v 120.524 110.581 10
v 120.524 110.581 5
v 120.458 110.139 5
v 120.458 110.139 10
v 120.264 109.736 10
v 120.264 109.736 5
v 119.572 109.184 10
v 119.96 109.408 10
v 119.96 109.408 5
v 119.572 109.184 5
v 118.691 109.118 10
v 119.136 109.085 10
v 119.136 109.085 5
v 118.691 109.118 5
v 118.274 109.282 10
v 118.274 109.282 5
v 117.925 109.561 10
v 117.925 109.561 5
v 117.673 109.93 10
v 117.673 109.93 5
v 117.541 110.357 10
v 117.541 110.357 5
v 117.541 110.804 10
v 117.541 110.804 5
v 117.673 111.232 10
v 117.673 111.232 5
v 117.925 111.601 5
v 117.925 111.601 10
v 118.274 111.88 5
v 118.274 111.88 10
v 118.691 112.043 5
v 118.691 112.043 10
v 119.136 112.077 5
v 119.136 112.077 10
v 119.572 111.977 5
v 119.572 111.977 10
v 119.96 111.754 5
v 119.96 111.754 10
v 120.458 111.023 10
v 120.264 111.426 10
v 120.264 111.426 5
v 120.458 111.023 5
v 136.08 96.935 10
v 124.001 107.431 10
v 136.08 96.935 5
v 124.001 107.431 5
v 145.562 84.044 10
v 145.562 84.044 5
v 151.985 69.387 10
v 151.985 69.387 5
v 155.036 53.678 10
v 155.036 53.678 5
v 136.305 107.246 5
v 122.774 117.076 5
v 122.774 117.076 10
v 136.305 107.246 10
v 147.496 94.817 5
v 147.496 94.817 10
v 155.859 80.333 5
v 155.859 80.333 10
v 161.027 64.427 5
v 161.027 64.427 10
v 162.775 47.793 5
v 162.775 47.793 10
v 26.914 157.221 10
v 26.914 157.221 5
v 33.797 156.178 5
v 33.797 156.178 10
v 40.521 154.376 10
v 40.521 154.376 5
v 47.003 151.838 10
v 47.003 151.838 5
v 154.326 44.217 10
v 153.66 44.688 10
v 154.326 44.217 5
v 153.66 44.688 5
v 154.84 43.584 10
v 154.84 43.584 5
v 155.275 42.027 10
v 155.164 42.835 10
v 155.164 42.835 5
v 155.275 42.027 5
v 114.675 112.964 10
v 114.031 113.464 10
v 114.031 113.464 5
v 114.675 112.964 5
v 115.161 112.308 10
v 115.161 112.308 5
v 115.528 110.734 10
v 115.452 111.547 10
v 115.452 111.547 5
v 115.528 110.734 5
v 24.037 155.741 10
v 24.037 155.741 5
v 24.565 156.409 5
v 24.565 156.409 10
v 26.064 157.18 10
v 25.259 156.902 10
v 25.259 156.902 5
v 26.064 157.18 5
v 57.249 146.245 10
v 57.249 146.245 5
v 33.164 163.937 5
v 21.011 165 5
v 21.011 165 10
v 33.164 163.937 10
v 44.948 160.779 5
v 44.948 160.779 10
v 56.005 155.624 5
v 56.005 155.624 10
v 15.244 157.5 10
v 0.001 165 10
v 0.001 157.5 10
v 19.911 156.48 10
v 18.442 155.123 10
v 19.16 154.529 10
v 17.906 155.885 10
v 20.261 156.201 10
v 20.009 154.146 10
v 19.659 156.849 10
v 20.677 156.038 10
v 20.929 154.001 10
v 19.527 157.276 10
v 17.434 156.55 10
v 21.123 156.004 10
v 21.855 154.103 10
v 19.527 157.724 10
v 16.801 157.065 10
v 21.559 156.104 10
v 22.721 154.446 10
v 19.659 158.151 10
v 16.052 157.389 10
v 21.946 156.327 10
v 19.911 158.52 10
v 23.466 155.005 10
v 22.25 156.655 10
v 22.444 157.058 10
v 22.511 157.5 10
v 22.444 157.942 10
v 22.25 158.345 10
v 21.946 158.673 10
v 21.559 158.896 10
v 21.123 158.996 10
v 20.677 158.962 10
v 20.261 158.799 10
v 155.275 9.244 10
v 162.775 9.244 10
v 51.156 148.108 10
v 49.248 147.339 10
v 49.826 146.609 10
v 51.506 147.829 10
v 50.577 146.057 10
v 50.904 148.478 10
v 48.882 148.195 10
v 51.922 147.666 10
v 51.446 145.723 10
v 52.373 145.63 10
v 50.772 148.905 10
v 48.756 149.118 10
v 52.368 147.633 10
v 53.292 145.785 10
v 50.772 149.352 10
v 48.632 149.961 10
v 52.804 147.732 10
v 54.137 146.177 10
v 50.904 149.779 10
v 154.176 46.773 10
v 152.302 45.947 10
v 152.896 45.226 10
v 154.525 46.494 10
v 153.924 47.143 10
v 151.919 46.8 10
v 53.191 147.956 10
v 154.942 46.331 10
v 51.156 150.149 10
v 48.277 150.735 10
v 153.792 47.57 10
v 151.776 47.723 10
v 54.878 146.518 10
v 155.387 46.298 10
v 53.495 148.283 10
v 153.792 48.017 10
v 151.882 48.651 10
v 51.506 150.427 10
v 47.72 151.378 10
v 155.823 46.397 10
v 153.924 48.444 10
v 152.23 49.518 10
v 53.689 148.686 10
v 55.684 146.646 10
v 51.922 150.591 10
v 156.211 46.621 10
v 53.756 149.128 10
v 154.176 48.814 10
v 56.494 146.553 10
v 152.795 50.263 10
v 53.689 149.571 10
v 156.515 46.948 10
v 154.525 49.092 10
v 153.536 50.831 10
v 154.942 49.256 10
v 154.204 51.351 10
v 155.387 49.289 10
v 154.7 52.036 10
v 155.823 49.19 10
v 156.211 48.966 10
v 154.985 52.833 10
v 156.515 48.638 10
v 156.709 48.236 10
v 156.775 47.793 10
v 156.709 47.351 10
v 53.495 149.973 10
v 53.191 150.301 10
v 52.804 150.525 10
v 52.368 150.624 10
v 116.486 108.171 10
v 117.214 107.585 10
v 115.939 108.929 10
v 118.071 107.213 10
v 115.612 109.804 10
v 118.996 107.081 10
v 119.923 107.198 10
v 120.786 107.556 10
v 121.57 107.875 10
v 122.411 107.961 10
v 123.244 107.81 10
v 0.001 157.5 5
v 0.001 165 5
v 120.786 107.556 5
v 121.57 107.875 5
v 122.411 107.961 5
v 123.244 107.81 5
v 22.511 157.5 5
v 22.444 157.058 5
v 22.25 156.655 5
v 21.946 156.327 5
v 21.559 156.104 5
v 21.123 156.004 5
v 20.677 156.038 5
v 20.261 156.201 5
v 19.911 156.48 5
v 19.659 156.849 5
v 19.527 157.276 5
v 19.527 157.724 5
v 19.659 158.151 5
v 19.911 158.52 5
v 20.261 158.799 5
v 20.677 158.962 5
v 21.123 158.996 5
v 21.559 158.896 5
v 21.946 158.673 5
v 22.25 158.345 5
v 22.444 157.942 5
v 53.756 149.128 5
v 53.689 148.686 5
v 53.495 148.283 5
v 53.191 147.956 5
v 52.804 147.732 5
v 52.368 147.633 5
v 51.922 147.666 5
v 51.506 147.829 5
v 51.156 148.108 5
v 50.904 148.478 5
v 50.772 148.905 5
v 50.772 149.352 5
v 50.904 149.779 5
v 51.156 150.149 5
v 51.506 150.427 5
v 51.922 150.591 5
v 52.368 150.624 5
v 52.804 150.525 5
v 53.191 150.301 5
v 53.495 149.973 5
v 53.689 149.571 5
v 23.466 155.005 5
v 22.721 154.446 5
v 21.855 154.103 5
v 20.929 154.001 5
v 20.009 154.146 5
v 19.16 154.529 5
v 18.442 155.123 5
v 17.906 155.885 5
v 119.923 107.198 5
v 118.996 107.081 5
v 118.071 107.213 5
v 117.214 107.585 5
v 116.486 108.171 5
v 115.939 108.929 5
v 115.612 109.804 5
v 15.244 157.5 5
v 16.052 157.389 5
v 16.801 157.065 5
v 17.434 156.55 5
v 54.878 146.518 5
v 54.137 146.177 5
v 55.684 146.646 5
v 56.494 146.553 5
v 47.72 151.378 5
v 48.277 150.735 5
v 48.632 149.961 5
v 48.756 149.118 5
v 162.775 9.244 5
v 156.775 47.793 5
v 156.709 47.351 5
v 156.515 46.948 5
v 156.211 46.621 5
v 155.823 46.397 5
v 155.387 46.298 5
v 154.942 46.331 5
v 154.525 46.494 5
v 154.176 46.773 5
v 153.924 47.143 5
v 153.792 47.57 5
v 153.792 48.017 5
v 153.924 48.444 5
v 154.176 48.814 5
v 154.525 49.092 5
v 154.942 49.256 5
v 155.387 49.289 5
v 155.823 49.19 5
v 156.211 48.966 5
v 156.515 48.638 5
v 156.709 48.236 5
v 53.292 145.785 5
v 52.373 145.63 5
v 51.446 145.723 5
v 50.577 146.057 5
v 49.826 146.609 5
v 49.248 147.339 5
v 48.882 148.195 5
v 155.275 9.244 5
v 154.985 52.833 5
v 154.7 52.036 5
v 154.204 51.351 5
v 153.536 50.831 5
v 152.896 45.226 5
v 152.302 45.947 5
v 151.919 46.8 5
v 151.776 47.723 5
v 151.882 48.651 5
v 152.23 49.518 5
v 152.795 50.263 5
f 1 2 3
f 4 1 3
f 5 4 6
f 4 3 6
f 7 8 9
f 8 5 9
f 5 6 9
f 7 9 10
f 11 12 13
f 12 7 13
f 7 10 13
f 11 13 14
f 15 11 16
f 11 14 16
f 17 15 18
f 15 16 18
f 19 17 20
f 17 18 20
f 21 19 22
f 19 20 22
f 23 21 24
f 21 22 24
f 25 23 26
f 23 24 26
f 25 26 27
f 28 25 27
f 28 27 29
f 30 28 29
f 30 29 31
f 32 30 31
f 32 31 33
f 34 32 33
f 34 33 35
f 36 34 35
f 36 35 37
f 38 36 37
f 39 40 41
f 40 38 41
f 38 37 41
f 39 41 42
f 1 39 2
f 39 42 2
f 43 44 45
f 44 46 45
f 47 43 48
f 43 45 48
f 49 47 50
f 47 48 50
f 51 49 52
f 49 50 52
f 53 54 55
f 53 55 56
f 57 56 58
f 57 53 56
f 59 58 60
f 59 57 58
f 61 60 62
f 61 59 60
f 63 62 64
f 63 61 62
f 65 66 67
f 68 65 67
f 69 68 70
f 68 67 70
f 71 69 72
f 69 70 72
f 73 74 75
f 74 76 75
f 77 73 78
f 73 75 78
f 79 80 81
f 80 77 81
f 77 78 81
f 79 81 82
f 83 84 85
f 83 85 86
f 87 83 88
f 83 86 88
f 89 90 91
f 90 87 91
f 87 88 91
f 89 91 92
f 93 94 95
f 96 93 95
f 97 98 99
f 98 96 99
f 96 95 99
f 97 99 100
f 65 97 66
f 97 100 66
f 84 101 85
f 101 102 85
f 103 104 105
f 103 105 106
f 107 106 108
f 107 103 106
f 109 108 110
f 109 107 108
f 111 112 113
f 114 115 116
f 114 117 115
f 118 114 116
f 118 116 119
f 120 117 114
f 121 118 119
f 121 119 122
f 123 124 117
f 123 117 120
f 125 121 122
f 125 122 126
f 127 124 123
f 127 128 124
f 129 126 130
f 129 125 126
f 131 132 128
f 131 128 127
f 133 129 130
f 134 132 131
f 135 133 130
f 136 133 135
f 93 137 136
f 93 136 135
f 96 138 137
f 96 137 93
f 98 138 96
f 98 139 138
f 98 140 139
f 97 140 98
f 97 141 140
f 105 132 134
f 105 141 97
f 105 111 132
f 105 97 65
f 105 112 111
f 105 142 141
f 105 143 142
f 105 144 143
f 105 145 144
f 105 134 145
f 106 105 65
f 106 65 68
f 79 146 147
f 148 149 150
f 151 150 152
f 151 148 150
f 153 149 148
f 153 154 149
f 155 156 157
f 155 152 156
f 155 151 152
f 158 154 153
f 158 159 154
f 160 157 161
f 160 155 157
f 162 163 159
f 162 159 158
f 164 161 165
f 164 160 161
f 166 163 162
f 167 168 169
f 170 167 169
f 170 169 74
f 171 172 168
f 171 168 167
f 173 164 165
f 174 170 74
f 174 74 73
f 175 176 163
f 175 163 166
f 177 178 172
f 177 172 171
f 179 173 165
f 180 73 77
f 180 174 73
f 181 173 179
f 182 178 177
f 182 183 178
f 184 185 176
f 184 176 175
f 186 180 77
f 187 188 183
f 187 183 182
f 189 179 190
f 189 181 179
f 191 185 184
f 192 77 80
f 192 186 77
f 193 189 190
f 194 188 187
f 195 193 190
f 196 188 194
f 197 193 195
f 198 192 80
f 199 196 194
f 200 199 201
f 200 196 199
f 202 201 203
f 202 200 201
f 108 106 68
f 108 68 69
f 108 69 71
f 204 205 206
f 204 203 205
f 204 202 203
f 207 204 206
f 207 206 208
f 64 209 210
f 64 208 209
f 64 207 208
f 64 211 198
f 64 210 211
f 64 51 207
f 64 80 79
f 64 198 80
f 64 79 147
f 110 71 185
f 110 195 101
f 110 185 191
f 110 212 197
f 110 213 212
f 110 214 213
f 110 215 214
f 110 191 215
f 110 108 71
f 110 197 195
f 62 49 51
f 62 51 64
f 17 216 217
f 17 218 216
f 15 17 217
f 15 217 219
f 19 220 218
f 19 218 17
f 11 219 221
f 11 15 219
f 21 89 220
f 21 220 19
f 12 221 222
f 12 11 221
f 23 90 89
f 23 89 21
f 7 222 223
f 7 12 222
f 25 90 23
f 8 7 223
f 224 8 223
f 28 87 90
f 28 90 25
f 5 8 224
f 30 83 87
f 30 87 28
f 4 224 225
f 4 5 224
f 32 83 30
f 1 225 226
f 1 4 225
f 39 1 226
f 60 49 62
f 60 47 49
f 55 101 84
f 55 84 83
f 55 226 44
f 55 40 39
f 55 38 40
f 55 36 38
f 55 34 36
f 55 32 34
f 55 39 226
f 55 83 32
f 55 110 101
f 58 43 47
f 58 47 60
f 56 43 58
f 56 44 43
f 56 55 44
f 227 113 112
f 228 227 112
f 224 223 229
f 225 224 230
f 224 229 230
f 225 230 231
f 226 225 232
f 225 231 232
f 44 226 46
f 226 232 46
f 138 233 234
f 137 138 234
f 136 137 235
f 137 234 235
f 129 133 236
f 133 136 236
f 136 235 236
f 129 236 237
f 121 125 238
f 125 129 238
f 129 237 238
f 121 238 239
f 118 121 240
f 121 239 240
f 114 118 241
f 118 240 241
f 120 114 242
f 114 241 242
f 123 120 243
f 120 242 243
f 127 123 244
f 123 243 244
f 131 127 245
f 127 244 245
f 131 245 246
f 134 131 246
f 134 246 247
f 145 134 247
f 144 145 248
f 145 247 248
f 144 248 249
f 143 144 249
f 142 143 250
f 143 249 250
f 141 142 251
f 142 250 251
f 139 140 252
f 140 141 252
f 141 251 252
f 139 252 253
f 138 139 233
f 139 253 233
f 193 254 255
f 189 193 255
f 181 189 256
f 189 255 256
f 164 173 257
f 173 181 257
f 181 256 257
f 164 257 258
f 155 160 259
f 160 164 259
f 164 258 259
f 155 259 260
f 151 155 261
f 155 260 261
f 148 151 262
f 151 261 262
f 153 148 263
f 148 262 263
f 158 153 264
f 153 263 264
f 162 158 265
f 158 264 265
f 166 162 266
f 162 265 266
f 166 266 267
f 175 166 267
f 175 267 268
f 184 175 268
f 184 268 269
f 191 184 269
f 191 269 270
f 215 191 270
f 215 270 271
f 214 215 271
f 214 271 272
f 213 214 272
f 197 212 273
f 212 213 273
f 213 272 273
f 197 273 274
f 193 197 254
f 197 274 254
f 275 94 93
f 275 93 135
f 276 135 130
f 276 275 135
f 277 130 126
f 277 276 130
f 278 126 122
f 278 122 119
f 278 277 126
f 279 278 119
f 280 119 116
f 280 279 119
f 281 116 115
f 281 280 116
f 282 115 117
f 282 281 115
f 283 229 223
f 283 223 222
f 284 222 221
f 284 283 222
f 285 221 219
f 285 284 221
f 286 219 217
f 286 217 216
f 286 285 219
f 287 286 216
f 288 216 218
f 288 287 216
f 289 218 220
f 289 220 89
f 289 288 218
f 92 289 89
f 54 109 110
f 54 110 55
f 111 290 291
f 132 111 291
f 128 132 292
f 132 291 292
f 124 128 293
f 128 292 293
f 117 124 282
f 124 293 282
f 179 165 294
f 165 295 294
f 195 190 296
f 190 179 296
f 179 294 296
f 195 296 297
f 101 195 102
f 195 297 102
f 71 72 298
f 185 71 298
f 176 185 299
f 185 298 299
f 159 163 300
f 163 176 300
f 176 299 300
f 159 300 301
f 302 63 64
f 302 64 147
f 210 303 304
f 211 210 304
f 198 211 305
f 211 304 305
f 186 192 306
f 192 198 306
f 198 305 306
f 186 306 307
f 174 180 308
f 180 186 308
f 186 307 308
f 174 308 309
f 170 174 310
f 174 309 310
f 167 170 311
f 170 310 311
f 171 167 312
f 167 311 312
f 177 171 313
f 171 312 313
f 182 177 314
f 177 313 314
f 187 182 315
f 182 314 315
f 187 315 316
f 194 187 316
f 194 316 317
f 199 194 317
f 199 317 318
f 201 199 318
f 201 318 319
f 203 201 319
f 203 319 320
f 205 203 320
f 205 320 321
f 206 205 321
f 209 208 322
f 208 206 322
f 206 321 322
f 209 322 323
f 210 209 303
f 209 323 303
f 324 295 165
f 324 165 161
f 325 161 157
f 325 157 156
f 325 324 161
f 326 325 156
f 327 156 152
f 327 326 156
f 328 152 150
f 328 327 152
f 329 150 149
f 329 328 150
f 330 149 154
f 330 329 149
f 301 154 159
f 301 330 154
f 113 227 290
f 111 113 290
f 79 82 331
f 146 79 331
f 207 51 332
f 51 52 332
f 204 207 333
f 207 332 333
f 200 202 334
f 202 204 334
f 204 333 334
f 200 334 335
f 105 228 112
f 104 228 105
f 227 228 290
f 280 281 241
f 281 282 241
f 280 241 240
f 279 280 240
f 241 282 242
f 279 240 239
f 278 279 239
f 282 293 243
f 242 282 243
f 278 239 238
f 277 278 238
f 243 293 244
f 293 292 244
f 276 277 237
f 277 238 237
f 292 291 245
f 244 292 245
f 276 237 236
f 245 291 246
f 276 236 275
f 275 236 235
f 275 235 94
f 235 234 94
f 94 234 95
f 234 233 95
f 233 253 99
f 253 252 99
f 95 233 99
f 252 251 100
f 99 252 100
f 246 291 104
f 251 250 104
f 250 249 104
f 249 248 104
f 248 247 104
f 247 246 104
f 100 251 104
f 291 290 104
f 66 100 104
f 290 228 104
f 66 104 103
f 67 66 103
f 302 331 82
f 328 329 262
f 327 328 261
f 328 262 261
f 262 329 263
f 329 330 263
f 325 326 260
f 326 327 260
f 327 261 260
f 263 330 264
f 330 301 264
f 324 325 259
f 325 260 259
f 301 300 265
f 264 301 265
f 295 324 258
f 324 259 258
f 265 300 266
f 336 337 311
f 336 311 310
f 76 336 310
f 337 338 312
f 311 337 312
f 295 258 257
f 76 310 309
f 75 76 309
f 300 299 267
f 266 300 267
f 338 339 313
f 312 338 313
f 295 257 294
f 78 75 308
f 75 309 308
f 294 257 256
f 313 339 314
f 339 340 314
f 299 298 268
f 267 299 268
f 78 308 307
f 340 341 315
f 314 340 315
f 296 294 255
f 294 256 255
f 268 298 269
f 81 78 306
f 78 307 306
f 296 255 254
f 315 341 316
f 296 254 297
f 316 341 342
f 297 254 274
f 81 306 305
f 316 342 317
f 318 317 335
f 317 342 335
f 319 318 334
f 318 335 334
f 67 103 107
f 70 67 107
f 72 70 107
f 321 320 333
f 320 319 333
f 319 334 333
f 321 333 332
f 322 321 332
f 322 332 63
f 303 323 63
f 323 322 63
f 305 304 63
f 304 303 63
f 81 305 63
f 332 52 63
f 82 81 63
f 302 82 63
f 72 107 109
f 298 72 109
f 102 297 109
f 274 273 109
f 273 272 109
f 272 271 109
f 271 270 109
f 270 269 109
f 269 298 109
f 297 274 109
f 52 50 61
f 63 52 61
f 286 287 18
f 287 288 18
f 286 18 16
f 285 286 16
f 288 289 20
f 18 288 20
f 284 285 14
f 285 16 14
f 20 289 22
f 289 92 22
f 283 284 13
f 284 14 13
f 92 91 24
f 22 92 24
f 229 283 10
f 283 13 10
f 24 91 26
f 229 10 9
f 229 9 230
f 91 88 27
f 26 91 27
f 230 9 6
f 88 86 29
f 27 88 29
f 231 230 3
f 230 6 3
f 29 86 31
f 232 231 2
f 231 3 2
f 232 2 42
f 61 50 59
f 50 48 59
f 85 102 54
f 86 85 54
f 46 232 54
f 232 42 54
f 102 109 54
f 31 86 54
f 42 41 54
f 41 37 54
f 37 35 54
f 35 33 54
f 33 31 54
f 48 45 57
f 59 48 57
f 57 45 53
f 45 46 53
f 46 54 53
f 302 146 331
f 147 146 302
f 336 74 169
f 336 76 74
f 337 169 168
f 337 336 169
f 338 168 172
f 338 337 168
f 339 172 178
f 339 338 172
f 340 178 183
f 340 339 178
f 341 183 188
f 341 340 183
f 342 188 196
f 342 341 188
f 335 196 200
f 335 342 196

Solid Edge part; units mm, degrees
sketch "Sketch1" plane through (0.0007, 14.651, 5) normal (0, 0, 1) x (1, 0, 0)
  line L0 (-114.0407, 98.8093) -> (-57.2599, 131.5929)
  arc A0 (-54.1474, 131.5247) -> (-57.2599, 131.5929) centre (-55.7598, 128.9948) ccw
  arc A1 (-47.0142, 137.1861) -> (-48.7662, 134.4664) centre (-45.7662, 134.458) ccw
  arc A2 (-47.0142, 137.1861) -> (-26.9146, 142.5706) centre (-21.0226, 80.3698) cw
  arc A3 (-24.0376, 141.0909) -> (-26.9146, 142.5706) centre (-26.6317, 139.5839) ccw
  arc A4 (-15.245, 142.849) -> (-17.9063, 141.2336) centre (-15.245, 139.849) ccw
  line L1 (-15.245, 142.849) -> (15.2436, 142.849)
  arc A5 (17.905, 141.2336) -> (15.2436, 142.849) centre (15.2436, 139.849) ccw
  arc A6 (26.9132, 142.5696) -> (24.036, 141.0904) centre (26.6298, 139.583) ccw
  arc A7 (26.9132, 142.5696) -> (47.0027, 137.1869) centre (21.0099, 80.3561) cw
  arc A8 (48.7549, 134.4673) -> (47.0027, 137.1869) centre (45.7549, 134.4587) ccw
  arc A9 (57.2487, 131.5943) -> (54.1362, 131.526) centre (55.7487, 128.9962) ccw
  line L2 (57.2487, 131.5943) -> (114.0299, 98.8129)
  arc A10 (115.5271, 96.0833) -> (114.0299, 98.8129) centre (112.5299, 96.2148) ccw
  arc A11 (124.0003, 92.7805) -> (120.7849, 92.9052) centre (122.2944, 90.3127) ccw
  arc A12 (124.0003, 92.7805) -> (155.0355, 39.027) centre (82.7747, 33.1424) cw
  arc A13 (153.5358, 36.1799) -> (155.0355, 39.027) centre (152.0454, 38.7835) ccw
  arc A14 (155.2747, 27.3761) -> (153.6593, 30.0375) centre (152.2747, 27.3761) ccw
  line L3 (155.2747, 27.3761) -> (155.2747, -38.192)
  arc A15 (153.6593, -40.8534) -> (155.2747, -38.192) centre (152.2747, -38.192) ccw
  arc A16 (154.9954, -49.8615) -> (153.5161, -46.9844) centre (152.0088, -49.5782) ccw
  arc A17 (154.9954, -49.8615) -> (149.6134, -69.9554) centre (92.7533, -43.9583) cw
  arc A18 (146.8942, -71.7079) -> (149.6134, -69.9554) centre (146.8851, -68.7079) ccw
  arc A19 (144.0217, -80.2016) -> (143.9534, -77.0892) centre (141.4236, -78.7016) ccw
  line L4 (144.0217, -80.2016) -> (127.6444, -108.5679)
  arc A20 (122.7007, -116.5716) -> (122.8583, -113.3403) centre (120.256, -114.8329) ccw
  arc A21 (77.6703, -142.5696) -> (122.7007, -116.5716) centre (71.767, -80.3476) ccw
  arc A22 (74.7931, -141.0904) -> (77.6703, -142.5696) centre (77.3869, -139.583) ccw
  arc A23 (66.0007, -142.849) -> (68.6621, -141.2336) centre (66.0007, -139.849) ccw
  line L5 (5.7656, -142.849) -> (66.0007, -142.849)
  arc A24 (3.1042, -141.2336) -> (5.7656, -142.849) centre (5.7656, -139.849) ccw
  arc A25 (-5.767, -142.849) -> (-3.1056, -141.2336) centre (-5.767, -139.849) ccw
  line L6 (-66.0021, -142.849) -> (-5.767, -142.849)
  arc A26 (-68.6634, -141.2336) -> (-66.0021, -142.849) centre (-66.0021, -139.849) ccw
  arc A27 (-77.6716, -142.5694) -> (-74.7944, -141.0903) centre (-77.3881, -139.5828) ccw
  arc A28 (-122.6994, -116.5717) -> (-77.6716, -142.5694) centre (-71.7665, -80.349) ccw
  arc A29 (-122.857, -113.3404) -> (-122.6994, -116.5717) centre (-120.2547, -114.833) ccw
  arc A30 (-128.7762, -106.6053) -> (-126.0465, -108.1024) centre (-126.1781, -105.1053) ccw
  line L7 (-144.0218, -80.199) -> (-128.7762, -106.6053)
  arc A31 (-143.9535, -77.0865) -> (-144.0218, -80.199) centre (-141.4237, -78.699) ccw
  arc A32 (-149.6144, -69.9531) -> (-146.8949, -71.7053) centre (-146.8862, -68.7053) ccw
  arc A33 (-154.9987, -49.8585) -> (-149.6144, -69.9531) centre (-92.7672, -43.9523) ccw
  arc A34 (-153.5196, -46.9813) -> (-154.9987, -49.8585) centre (-152.0122, -49.5751) ccw
  arc A35 (-155.2786, -38.189) -> (-153.6631, -40.8503) centre (-152.2786, -38.1889) ccw
  line L8 (-155.2818, 27.3758) -> (-155.2786, -38.189)
  arc A36 (-153.6665, 30.0373) -> (-155.2818, 27.3758) centre (-152.2818, 27.376) ccw
  arc A37 (-155.0428, 39.0267) -> (-153.5432, 36.1796) centre (-152.0527, 38.7832) ccw
  arc A38 (-124.0109, 92.7765) -> (-155.0428, 39.0267) centre (-82.7847, 33.1421) ccw
  arc A39 (-120.7955, 92.9014) -> (-124.0109, 92.7765) centre (-122.3049, 90.3088) ccw
  arc A40 (-114.0407, 98.8093) -> (-115.5378, 96.0796) centre (-112.5406, 96.2112) ccw
  arc A41 (-48.7662, 134.4664) -> (-54.1474, 131.5247) centre (-52.2662, 134.4761) cw
  arc A42 (-17.9064, 141.2336) -> (-24.0377, 141.0909) centre (-21.0113, 142.849) cw
  arc A43 (24.036, 141.0904) -> (17.905, 141.2336) centre (21.0099, 142.849) cw
  arc A44 (54.1362, 131.526) -> (48.7549, 134.4673) centre (52.2549, 134.4774) cw
  arc A45 (120.7849, 92.9052) -> (115.5271, 96.0832) centre (119.0237, 95.9298) cw
  arc A46 (153.6593, 30.0375) -> (153.5358, 36.1799) centre (155.2747, 33.1424) cw
  arc A47 (153.5161, -46.9844) -> (153.6593, -40.8534) centre (155.2747, -43.9583) cw
  arc A48 (143.9534, -77.0891) -> (146.8942, -71.7079) centre (146.9048, -75.2079) cw
  arc A49 (122.8584, -113.3404) -> (127.6444, -108.5679) centre (125.8944, -111.599) cw
  arc A50 (68.6621, -141.2336) -> (74.7931, -141.0904) centre (71.767, -142.849) cw
  arc A51 (-3.1056, -141.2336) -> (3.1042, -141.2336) centre (-0.0007, -142.849) cw
  arc A52 (-74.7944, -141.0903) -> (-68.6635, -141.2336) centre (-71.7684, -142.849) cw
  arc A53 (-126.0466, -108.1024) -> (-122.857, -113.3404) centre (-125.8931, -111.599) cw
  arc A54 (-146.8949, -71.7053) -> (-143.9536, -77.0866) centre (-146.905, -75.2053) cw
  arc A55 (-153.6632, -40.8503) -> (-153.5196, -46.9813) centre (-155.2784, -43.9553) cw
  arc A56 (-153.5432, 36.1796) -> (-153.6665, 30.0373) centre (-155.2821, 33.1421) cw
  arc A57 (-115.5377, 96.0796) -> (-120.7955, 92.9014) centre (-119.0344, 95.926) cw
  line L9 (-56.0166, 140.971) -> (-122.7845, 102.4212)
  arc A58 (-162.7821, 33.1421) -> (-122.7845, 102.4212) centre (-82.7847, 33.1421) cw
  line L10 (-162.7821, 33.1421) -> (-162.7784, -43.9553)
  arc A59 (-162.7784, -43.9553) -> (-153.4002, -78.9553) centre (-92.7784, -43.9553) ccw
  line L11 (-132.3882, -115.349) -> (-153.4002, -78.9553)
  arc A60 (-132.3882, -115.349) -> (-71.7683, -150.349) centre (-71.7665, -80.349) ccw
  line L12 (71.767, -150.349) -> (-71.7683, -150.349)
  arc A61 (71.767, -150.349) -> (132.3896, -115.349) centre (71.7678, -80.349) ccw
  line L13 (132.3896, -115.349) -> (153.4002, -78.9576)
  arc A62 (162.7747, -43.9583) -> (153.4002, -78.9576) centre (92.791, -43.9684) cw
  line L14 (162.7747, 33.1424) -> (162.7747, -43.9583)
  arc A63 (122.7736, 102.4251) -> (162.7747, 33.1424) centre (82.7747, 33.1424) cw
  line L15 (56.0045, 140.9728) -> (122.7736, 102.4251)
  arc A64 (21.0099, 150.349) -> (56.0045, 140.9728) centre (21.008, 80.349) cw
  line L16 (-21.0112, 150.349) -> (21.0099, 150.349)
  arc A65 (-32.5074, 149.4015) -> (-21.0112, 150.349) centre (-20.997, 79.961) cw
  arc A66 (-44.641, 146.2432) -> (-32.5074, 149.4015) centre (-21.0122, 80.3518) cw
  arc A67 (-56.0166, 140.971) -> (-44.641, 146.2432) centre (-21.0122, 80.3518) cw
  circle A68 centre (-71.7683, -142.849) radius 1.5
  circle A69 centre (-0.0007, -142.849) radius 1.5
  circle A70 centre (-125.893, -111.599) radius 1.5
  circle A71 centre (-146.905, -75.2053) radius 1.5
  circle A72 centre (-155.2784, -43.9553) radius 1.5
  circle A73 centre (-155.2821, 33.1421) radius 1.5
  circle A74 centre (-119.0344, 95.9261) radius 1.5
  circle A75 centre (-52.2662, 134.4761) radius 1.5
  circle A76 centre (-21.0112, 142.849) radius 1.5
  circle A77 centre (21.0099, 142.849) radius 1.5
  circle A78 centre (52.2549, 134.4774) radius 1.5
  circle A79 centre (119.0237, 95.9298) radius 1.5
  circle A80 centre (155.2747, 33.1424) radius 1.5
  circle A81 centre (155.2747, -43.9583) radius 1.5
  circle A82 centre (146.9048, -75.2079) radius 1.5
  circle A83 centre (125.8944, -111.599) radius 1.5
  circle A84 centre (71.767, -142.849) radius 1.5
extrude "ExtrudedProtrusion_7" add sketch "Sketch1" along normal blind 5
sketch "Sketch2" plane through (-0.003, 14.651, 10) normal (0, 0, 1) x (1, 0, 0)
  line L0 (-170.0115, -5.4066) -> (169.0999, -5.4066)
  line L1 (169.0999, -5.4066) -> (169.0999, -159.984)
  line L2 (169.0999, -159.984) -> (-170.0115, -159.984)
  line L3 (-170.0115, -159.984) -> (-170.0115, -5.4066)
extrude "Cutout1" cut sketch "Sketch2" against normal up to next
sketch "Sketch3" plane through (-0.003, 87.1222, 10) normal (0, 0, 1) x (0.866, -0.5, 0)
  line L0 (-35.1853, 60.951) -> (-42.5637, 73.7312)
  line L1 (-42.5637, 73.7312) -> (-202.1881, -18.4247)
  line L2 (-202.1881, -18.4247) -> (-113.6218, -171.8315)
  line L3 (-113.6218, -171.8315) -> (46.0026, -79.6757)
  line L4 (-35.1853, 60.951) -> (46.0026, -79.6757)
extrude "Cutout2" cut sketch "Sketch3" against normal up to next
properties material "Polycarbonate"
